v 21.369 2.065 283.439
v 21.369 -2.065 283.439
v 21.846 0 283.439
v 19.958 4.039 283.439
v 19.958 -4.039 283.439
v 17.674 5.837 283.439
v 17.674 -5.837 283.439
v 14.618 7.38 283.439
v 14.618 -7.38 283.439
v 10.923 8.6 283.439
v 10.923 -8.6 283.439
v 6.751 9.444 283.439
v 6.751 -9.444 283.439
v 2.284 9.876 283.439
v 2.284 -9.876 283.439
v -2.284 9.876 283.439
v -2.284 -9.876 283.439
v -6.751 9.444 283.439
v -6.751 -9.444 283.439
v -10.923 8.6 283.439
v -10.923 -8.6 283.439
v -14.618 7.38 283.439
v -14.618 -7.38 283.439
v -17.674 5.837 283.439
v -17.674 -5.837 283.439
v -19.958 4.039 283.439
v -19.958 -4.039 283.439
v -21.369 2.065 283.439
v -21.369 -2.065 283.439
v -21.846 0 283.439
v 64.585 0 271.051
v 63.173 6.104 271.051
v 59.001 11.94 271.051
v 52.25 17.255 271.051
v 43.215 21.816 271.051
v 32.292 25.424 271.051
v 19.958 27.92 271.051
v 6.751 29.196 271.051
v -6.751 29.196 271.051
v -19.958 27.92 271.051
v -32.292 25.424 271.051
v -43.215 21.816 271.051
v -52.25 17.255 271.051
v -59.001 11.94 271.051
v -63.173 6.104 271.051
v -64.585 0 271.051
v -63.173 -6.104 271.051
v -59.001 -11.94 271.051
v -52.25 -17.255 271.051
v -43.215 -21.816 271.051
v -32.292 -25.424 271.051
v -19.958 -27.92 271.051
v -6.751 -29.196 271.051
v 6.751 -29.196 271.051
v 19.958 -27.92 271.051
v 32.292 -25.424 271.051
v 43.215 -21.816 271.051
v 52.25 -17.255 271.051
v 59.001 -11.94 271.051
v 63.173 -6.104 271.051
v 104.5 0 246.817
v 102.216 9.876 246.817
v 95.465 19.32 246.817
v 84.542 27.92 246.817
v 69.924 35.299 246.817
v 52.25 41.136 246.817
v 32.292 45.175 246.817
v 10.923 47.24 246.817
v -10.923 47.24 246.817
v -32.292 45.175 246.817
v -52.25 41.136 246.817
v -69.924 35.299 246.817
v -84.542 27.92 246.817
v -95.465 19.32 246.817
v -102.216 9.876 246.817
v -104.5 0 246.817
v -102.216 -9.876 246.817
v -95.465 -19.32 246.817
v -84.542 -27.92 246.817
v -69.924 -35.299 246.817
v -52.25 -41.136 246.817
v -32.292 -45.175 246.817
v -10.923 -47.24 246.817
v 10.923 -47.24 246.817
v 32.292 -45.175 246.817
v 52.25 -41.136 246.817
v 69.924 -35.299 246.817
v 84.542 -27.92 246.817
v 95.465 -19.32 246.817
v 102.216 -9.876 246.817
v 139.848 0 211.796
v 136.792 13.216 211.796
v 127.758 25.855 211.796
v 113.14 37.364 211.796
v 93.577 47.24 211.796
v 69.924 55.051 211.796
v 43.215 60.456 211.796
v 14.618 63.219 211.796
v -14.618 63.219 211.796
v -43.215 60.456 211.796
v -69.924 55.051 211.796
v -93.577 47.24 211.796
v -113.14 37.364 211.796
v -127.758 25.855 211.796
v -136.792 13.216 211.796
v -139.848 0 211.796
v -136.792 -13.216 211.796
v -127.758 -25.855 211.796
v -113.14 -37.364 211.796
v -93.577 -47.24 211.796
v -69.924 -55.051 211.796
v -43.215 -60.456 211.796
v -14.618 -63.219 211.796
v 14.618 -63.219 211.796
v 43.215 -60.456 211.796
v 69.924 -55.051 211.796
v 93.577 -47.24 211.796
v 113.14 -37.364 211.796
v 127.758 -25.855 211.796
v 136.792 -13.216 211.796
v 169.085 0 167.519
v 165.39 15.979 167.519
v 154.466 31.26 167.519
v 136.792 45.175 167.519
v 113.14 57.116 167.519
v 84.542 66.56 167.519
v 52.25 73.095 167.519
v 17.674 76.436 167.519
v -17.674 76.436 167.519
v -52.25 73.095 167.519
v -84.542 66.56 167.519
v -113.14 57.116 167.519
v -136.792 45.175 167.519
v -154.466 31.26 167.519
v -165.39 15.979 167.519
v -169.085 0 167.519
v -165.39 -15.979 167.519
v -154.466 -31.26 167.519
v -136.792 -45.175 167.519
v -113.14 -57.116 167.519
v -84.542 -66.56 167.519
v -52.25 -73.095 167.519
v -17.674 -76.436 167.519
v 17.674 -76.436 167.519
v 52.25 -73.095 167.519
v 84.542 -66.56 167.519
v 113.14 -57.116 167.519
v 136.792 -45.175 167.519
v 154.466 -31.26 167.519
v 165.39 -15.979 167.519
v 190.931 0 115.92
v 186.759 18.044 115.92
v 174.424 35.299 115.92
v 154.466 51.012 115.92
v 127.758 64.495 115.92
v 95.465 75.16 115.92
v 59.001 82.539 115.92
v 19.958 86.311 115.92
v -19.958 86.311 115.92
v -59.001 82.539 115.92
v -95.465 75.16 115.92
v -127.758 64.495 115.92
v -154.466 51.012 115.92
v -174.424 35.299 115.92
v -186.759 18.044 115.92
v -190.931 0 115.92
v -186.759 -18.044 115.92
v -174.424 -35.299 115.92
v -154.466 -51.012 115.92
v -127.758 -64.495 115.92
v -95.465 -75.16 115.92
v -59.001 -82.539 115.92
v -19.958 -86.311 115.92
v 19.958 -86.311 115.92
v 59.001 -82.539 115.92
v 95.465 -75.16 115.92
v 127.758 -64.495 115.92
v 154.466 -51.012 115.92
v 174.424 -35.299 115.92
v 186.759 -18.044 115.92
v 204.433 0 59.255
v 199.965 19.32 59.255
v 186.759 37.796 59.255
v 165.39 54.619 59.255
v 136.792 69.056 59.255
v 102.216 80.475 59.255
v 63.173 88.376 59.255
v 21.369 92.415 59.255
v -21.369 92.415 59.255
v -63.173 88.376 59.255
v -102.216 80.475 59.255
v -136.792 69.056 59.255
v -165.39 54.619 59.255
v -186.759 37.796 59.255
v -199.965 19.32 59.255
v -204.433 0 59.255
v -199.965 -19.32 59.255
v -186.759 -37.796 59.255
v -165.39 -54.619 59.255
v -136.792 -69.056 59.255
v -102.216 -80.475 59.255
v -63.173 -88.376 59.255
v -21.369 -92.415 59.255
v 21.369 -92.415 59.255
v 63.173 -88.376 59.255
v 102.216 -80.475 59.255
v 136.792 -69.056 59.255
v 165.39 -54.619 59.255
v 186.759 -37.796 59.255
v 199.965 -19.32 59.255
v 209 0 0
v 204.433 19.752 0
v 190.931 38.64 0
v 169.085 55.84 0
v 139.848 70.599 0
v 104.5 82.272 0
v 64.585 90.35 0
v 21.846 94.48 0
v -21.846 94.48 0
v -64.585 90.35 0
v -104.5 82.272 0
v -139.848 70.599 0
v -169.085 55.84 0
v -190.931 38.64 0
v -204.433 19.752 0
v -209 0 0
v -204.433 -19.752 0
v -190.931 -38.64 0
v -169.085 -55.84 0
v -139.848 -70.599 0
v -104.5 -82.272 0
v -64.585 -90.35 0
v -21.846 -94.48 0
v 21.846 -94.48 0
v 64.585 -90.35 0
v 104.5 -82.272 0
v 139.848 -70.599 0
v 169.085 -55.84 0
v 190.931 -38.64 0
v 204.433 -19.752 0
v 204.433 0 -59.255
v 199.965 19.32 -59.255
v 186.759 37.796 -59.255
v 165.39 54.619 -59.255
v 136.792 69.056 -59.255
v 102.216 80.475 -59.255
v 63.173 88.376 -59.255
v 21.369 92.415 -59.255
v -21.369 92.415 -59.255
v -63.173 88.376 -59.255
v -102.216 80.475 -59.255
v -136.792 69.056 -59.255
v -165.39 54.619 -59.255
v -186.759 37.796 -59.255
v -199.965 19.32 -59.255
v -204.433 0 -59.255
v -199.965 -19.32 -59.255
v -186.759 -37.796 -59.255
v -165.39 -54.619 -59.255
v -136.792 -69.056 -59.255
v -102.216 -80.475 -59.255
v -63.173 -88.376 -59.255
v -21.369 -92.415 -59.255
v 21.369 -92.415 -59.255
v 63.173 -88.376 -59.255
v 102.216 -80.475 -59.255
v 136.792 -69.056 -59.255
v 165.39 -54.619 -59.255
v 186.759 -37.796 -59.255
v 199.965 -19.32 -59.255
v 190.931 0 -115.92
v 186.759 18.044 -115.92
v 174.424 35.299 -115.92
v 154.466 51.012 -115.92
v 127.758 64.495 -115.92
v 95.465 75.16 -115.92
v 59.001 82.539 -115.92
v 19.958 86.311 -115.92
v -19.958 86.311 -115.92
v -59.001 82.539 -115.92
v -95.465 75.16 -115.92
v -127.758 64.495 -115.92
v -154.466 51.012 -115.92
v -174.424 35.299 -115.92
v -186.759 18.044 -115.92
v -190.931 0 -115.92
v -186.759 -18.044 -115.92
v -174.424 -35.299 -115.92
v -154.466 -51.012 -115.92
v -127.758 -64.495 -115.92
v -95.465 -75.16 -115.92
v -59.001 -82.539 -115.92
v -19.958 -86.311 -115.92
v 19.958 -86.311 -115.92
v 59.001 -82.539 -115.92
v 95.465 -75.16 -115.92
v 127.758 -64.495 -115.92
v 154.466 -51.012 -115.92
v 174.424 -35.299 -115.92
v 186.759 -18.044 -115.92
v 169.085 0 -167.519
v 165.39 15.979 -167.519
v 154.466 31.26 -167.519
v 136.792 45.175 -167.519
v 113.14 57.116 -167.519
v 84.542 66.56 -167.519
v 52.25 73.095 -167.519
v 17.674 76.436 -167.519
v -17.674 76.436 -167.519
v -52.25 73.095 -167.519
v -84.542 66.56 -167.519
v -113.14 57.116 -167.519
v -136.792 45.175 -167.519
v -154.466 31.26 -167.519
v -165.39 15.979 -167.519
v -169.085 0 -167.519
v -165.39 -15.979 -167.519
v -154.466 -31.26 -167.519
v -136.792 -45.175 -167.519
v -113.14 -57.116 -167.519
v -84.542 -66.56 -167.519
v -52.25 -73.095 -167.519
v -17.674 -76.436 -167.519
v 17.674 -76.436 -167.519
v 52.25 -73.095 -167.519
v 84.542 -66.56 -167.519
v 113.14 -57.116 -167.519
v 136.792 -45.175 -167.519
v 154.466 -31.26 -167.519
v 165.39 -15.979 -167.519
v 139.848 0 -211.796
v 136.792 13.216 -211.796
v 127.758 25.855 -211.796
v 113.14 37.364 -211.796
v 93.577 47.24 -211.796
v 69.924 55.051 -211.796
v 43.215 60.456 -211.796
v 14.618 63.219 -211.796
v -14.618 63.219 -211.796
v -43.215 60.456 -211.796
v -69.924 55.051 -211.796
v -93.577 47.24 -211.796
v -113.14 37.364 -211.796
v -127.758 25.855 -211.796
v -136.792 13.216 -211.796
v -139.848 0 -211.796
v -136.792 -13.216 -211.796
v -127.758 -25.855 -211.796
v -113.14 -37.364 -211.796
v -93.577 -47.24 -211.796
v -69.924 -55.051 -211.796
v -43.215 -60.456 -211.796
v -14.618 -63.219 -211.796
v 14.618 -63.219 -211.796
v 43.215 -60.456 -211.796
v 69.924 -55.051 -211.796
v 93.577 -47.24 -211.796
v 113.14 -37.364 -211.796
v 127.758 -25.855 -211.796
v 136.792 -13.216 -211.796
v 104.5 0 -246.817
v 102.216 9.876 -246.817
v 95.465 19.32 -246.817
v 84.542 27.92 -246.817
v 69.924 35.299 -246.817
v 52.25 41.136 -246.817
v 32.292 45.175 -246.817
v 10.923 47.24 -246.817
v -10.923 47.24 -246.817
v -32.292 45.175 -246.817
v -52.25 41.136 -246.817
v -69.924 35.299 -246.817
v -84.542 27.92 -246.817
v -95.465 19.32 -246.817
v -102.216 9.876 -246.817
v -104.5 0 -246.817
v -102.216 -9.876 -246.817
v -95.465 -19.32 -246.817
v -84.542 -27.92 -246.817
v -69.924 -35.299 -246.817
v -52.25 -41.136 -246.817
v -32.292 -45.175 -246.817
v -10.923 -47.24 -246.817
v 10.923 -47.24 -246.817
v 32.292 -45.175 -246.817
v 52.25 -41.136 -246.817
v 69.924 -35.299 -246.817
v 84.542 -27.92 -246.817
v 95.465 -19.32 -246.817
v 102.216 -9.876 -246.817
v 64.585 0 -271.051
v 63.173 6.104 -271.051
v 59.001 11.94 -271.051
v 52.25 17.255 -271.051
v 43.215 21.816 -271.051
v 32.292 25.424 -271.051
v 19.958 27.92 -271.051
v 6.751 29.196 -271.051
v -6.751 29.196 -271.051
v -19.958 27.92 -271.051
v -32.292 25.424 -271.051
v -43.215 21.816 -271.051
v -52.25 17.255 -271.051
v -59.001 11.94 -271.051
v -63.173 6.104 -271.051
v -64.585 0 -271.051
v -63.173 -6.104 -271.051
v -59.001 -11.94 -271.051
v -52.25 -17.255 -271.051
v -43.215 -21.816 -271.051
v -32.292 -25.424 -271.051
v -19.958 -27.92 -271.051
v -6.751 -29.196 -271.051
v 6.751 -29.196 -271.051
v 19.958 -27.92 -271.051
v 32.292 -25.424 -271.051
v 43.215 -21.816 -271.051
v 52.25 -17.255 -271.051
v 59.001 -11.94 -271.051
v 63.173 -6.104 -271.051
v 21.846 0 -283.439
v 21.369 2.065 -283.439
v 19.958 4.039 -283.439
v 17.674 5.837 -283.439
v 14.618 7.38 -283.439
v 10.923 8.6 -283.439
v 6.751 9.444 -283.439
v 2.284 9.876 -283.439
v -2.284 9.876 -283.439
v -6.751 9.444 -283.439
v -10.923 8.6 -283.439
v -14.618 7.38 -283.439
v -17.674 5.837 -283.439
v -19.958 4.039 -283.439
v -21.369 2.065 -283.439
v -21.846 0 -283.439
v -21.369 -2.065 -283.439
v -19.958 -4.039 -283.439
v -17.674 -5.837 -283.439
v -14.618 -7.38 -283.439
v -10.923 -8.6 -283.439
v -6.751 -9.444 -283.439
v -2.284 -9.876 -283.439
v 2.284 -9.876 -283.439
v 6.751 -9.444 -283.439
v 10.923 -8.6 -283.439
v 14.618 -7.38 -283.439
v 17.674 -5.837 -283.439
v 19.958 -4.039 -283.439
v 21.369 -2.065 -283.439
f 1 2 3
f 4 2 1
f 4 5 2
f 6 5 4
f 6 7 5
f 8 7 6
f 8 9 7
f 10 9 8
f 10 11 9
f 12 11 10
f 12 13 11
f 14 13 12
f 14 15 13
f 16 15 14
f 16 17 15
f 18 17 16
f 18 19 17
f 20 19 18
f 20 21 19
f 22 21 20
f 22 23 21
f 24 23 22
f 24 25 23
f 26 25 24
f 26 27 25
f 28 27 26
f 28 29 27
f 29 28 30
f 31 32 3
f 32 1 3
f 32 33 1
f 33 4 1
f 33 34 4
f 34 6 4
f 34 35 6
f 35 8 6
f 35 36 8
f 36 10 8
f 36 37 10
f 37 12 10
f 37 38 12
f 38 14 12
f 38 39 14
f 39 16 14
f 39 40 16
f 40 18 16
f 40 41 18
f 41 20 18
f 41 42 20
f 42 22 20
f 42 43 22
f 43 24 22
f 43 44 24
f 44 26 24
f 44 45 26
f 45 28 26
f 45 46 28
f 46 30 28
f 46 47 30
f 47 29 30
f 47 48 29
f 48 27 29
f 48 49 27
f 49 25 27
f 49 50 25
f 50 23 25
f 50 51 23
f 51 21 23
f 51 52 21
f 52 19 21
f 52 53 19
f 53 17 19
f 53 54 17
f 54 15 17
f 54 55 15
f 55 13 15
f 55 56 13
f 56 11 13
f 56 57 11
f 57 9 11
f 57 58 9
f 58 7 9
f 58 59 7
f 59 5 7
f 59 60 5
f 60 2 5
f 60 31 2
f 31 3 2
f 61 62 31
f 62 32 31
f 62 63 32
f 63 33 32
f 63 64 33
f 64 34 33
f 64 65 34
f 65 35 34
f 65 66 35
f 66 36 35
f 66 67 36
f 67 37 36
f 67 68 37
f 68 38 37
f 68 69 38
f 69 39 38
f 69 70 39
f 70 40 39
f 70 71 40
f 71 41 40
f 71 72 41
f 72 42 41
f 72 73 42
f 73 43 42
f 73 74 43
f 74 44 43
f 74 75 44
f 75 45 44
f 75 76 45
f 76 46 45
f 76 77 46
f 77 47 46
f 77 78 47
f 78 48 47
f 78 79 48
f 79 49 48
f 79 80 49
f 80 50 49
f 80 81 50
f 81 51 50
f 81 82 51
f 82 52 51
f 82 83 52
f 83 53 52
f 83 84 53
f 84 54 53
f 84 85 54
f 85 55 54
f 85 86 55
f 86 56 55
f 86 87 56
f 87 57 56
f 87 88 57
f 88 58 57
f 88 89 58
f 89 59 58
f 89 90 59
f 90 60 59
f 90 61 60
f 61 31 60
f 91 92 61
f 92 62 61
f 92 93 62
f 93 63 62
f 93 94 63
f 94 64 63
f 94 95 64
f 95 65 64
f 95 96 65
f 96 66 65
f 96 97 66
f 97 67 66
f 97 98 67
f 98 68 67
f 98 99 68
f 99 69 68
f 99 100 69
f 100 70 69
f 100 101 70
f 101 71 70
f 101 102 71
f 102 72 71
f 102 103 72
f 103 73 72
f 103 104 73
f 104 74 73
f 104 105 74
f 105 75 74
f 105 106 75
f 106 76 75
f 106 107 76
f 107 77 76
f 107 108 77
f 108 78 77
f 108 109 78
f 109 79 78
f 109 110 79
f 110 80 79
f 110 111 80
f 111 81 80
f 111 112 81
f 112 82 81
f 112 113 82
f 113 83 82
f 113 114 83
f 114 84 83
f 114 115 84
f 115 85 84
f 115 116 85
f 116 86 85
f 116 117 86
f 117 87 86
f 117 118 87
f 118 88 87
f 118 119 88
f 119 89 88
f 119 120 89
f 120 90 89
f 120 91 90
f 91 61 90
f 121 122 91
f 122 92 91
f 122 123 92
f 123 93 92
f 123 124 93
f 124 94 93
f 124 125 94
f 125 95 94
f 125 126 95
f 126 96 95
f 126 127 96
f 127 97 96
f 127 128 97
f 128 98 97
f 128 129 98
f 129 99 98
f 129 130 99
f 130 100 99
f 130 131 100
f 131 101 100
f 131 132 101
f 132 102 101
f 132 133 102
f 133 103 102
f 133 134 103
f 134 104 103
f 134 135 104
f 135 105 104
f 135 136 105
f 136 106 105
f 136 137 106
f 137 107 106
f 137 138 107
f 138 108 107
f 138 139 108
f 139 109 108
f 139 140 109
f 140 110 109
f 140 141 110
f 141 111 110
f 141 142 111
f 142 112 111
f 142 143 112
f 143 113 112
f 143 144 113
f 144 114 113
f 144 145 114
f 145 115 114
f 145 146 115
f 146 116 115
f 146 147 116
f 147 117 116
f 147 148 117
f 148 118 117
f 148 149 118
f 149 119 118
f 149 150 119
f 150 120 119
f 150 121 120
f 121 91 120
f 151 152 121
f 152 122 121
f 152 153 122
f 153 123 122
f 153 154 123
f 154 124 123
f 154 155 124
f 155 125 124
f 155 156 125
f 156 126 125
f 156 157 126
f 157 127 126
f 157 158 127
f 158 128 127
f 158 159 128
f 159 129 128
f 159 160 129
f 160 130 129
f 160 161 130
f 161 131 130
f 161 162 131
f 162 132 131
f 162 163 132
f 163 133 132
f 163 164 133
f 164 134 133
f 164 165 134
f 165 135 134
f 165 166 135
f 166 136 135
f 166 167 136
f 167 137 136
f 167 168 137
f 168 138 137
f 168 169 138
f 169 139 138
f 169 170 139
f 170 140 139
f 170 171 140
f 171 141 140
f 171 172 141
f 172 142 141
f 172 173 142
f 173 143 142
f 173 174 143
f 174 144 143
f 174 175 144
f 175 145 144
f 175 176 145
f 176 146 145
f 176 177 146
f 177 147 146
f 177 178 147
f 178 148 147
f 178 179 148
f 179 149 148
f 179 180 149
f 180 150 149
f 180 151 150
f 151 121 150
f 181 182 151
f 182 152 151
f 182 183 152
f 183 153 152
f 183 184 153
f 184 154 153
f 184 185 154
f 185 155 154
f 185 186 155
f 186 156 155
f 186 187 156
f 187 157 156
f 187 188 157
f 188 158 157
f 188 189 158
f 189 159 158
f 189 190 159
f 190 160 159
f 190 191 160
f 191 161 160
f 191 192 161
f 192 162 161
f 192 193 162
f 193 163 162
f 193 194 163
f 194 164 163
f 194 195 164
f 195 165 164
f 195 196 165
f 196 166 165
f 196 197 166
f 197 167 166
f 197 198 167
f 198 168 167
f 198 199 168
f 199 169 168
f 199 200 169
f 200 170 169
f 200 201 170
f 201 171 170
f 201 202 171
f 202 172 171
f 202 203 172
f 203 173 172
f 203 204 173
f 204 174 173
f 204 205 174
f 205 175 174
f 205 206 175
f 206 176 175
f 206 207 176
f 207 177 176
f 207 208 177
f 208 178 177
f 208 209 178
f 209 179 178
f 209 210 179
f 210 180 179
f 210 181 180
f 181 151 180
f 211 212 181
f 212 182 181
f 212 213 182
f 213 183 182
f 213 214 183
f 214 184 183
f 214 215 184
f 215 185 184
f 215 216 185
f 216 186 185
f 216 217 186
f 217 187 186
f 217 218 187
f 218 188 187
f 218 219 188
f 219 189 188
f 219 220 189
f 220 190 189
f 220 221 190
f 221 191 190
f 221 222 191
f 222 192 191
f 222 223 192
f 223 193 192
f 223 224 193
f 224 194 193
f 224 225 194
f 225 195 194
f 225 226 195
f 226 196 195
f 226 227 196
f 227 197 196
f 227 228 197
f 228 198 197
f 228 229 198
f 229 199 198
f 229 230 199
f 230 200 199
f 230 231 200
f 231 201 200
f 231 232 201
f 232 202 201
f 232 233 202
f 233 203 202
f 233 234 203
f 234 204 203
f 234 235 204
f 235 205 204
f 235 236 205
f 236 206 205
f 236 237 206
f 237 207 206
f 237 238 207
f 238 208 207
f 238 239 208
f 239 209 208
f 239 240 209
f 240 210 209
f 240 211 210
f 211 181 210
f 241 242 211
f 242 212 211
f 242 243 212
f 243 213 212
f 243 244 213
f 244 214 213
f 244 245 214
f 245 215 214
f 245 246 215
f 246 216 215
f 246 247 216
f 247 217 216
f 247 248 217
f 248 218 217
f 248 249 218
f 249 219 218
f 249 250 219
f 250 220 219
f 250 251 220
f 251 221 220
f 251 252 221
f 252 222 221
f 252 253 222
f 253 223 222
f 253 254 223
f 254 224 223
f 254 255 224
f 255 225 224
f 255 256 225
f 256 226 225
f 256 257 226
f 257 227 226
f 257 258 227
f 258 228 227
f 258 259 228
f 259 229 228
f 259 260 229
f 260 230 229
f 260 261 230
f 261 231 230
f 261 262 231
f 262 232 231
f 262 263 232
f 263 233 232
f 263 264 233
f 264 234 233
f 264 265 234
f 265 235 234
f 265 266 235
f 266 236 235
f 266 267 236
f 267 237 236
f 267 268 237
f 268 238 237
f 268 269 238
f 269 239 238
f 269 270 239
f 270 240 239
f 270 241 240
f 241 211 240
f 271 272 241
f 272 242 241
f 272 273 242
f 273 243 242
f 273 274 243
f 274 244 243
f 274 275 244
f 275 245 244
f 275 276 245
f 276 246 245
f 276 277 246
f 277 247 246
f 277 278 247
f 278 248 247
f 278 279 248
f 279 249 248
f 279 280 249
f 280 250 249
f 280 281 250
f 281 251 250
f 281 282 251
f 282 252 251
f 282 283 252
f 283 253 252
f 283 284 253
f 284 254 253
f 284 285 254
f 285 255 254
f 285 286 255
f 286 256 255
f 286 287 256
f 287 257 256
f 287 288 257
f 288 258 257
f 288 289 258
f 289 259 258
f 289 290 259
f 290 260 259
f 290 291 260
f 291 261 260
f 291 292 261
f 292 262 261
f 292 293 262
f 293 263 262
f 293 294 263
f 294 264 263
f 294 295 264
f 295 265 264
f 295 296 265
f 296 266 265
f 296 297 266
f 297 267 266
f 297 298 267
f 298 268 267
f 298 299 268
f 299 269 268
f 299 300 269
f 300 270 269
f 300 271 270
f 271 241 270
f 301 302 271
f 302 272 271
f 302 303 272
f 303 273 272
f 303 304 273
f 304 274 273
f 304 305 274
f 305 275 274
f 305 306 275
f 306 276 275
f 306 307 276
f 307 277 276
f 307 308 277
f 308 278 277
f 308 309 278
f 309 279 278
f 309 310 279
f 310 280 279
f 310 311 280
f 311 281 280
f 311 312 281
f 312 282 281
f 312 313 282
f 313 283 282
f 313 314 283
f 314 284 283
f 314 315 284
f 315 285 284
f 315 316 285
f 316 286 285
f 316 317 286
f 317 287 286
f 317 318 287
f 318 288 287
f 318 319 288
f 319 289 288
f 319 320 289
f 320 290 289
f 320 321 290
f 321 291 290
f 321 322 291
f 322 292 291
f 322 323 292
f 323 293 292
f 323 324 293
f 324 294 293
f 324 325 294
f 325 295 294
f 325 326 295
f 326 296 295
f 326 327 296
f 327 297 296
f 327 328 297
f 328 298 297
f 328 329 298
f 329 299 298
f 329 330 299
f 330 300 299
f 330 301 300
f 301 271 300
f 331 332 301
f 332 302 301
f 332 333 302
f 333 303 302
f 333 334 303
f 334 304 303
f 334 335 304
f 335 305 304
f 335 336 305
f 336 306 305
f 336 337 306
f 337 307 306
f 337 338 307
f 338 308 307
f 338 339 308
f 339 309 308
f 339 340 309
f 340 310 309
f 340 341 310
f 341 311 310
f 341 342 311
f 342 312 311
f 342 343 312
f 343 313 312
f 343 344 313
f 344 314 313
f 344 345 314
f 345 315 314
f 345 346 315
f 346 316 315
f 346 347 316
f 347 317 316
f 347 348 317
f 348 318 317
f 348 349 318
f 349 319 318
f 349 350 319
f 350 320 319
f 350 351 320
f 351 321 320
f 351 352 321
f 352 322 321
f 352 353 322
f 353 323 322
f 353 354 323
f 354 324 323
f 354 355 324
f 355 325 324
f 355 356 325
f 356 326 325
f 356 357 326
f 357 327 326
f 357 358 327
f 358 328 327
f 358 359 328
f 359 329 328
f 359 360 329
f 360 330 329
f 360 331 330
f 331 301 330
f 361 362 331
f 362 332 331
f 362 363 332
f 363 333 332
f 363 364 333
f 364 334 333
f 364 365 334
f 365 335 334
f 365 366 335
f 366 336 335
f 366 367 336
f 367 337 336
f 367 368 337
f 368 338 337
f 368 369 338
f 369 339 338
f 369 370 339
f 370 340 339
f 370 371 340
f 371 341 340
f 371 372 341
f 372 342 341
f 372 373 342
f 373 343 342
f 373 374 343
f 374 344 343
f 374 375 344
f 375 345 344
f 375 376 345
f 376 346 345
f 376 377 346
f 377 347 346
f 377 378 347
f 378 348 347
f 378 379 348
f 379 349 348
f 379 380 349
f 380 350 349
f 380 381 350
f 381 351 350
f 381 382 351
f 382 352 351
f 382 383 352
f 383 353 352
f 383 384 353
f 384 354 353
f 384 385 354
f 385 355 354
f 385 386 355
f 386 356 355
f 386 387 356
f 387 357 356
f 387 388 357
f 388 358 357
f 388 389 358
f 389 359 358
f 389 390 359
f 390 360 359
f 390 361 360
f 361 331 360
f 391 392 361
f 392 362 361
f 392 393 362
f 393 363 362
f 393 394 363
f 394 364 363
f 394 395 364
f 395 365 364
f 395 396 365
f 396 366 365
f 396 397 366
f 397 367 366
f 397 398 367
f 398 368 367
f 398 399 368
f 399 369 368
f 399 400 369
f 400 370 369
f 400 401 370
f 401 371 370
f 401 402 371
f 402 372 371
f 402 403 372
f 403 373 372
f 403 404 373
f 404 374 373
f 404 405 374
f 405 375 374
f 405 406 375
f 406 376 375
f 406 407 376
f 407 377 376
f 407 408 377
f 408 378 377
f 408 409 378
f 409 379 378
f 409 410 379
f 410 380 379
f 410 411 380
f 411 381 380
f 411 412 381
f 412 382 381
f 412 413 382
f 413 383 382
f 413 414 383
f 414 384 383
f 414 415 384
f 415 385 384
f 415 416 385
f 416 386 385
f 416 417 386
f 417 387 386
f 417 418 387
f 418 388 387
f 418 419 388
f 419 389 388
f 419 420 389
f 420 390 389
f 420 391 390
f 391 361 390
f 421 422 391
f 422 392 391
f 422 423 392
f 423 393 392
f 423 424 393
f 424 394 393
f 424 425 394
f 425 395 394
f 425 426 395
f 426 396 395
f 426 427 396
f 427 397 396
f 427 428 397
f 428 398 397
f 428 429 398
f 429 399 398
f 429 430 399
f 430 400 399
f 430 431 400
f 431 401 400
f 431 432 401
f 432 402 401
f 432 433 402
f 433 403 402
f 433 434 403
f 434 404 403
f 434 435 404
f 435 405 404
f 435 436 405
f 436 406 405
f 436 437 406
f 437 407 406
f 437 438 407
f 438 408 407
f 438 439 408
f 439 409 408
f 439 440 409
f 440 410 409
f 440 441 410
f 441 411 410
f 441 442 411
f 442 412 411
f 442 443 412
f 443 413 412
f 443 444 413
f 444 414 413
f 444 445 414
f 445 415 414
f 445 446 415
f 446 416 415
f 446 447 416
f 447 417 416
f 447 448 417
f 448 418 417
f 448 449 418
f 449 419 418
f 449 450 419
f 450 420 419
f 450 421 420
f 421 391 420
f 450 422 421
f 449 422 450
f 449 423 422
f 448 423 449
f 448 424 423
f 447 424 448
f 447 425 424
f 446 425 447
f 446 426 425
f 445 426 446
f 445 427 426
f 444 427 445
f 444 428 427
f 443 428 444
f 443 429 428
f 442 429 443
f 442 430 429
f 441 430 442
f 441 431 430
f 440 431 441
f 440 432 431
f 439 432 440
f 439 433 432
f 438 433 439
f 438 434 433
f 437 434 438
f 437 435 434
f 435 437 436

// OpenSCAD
// Generated by SolidPython 1.0.1 on 2020-07-29 00:46:49


scale(v = [11, 5, 15]) {
	sphere(r = 19);
}
/***********************************************
*********      SolidPython code:      **********
************************************************
 
# import packages: SolidPython
from solid import *
from solid.utils import *
from itertools import chain, combinations, permutations


class Resize:

    def __init__(self, scad_file):
        self.scad_file = scad_file
        #self.scad_file = import_scad(scad_file)
        # cone/cylinder param:
        self.r1 = 0
        self.r2 = 0
        self.h = 0
        # rectangular prism param:
        self.w = 0
        self.l = 0
        # ellipse param:
        self.r = 0

    # import OpenScad code (file name corresponds to shape)


    # classify shape + parameters
    def assign(self, param1, param2, param3):
        if self.scad_file == 'cone.scad':
            self.r1 = param1
            self.r2 = param2
            self.h = param3
        elif self.scad_file == 'cylinder.scad':
            self.r1 = param1
            self.r2 = param2
            self.h = param3
        elif self.scad_file == 'rectangularPrism.scad':
            self.h = param1
            self.l = param2
            self.w = param3
        else:
            self.r = param1
            self.h = param2

    # resize parameters
    def iterate(self):
        x = range(3, 20, 2)
        i = 1
        if self.scad_file == 'cone.scad':
            tempList = list(permutations(x, 2))
            for temp in tempList:
                param1 = temp[0]
                param2 = temp[1]
                filepath = 'produced_scad_files/' + 'cone' + str(param1) + '_' + str(param2) + '_' + '.scad'
                scad_render_to_file(cylinder(h=param1, r1=param2, r2=0), filepath)

        elif self.scad_file == 'cylinder.scad':
            tempList = list(permutations(x, 3))
            for temp in tempList:
                param1 = temp[0]
                param2 = temp[1]
                filepath = 'produced_scad_files/' + 'cylinder' + str(param1) + '_' + str(param2) + '_' + '.scad'
                scad_render_to_file(cylinder(h=param1, r1=param2, r2=param2), filepath)

        elif self.scad_file == 'rectangularPrism.scad':
            tempList = list(permutations(x, 3))
            for temp in tempList:
                param1 = temp[0]
                param2 = temp[1]
                param3 = temp[2]
                filepath = 'produced_scad_files/' + 'rectangularPrism' + str(param1) + '_' + str(param2) + '_' + str(
                    param3) + '.scad'
                scad_render_to_file(cube(size=(param1, param2, param3)), filepath)

        elif self.scad_file == 'ellipse.scad':
            tempList = list(permutations(x, 4))
            for temp in tempList:
                param1 = temp[0]
                param2 = temp[1]
                param3 = temp[2]
                param4 = temp[3]
                filepath = 'produced_scad_files/' + 'ellipse' + str(param1) + '_' + str(param2) + '_' + str(param3) + '_' + str(param4) + '.scad'
                scad_render_to_file(scale([param1, param2, param3])(sphere(r=param4)), filepath)

    def render_to_scadfile(self):
        scad_render_to_file(scad, 'example.scad') 
 
************************************************/
